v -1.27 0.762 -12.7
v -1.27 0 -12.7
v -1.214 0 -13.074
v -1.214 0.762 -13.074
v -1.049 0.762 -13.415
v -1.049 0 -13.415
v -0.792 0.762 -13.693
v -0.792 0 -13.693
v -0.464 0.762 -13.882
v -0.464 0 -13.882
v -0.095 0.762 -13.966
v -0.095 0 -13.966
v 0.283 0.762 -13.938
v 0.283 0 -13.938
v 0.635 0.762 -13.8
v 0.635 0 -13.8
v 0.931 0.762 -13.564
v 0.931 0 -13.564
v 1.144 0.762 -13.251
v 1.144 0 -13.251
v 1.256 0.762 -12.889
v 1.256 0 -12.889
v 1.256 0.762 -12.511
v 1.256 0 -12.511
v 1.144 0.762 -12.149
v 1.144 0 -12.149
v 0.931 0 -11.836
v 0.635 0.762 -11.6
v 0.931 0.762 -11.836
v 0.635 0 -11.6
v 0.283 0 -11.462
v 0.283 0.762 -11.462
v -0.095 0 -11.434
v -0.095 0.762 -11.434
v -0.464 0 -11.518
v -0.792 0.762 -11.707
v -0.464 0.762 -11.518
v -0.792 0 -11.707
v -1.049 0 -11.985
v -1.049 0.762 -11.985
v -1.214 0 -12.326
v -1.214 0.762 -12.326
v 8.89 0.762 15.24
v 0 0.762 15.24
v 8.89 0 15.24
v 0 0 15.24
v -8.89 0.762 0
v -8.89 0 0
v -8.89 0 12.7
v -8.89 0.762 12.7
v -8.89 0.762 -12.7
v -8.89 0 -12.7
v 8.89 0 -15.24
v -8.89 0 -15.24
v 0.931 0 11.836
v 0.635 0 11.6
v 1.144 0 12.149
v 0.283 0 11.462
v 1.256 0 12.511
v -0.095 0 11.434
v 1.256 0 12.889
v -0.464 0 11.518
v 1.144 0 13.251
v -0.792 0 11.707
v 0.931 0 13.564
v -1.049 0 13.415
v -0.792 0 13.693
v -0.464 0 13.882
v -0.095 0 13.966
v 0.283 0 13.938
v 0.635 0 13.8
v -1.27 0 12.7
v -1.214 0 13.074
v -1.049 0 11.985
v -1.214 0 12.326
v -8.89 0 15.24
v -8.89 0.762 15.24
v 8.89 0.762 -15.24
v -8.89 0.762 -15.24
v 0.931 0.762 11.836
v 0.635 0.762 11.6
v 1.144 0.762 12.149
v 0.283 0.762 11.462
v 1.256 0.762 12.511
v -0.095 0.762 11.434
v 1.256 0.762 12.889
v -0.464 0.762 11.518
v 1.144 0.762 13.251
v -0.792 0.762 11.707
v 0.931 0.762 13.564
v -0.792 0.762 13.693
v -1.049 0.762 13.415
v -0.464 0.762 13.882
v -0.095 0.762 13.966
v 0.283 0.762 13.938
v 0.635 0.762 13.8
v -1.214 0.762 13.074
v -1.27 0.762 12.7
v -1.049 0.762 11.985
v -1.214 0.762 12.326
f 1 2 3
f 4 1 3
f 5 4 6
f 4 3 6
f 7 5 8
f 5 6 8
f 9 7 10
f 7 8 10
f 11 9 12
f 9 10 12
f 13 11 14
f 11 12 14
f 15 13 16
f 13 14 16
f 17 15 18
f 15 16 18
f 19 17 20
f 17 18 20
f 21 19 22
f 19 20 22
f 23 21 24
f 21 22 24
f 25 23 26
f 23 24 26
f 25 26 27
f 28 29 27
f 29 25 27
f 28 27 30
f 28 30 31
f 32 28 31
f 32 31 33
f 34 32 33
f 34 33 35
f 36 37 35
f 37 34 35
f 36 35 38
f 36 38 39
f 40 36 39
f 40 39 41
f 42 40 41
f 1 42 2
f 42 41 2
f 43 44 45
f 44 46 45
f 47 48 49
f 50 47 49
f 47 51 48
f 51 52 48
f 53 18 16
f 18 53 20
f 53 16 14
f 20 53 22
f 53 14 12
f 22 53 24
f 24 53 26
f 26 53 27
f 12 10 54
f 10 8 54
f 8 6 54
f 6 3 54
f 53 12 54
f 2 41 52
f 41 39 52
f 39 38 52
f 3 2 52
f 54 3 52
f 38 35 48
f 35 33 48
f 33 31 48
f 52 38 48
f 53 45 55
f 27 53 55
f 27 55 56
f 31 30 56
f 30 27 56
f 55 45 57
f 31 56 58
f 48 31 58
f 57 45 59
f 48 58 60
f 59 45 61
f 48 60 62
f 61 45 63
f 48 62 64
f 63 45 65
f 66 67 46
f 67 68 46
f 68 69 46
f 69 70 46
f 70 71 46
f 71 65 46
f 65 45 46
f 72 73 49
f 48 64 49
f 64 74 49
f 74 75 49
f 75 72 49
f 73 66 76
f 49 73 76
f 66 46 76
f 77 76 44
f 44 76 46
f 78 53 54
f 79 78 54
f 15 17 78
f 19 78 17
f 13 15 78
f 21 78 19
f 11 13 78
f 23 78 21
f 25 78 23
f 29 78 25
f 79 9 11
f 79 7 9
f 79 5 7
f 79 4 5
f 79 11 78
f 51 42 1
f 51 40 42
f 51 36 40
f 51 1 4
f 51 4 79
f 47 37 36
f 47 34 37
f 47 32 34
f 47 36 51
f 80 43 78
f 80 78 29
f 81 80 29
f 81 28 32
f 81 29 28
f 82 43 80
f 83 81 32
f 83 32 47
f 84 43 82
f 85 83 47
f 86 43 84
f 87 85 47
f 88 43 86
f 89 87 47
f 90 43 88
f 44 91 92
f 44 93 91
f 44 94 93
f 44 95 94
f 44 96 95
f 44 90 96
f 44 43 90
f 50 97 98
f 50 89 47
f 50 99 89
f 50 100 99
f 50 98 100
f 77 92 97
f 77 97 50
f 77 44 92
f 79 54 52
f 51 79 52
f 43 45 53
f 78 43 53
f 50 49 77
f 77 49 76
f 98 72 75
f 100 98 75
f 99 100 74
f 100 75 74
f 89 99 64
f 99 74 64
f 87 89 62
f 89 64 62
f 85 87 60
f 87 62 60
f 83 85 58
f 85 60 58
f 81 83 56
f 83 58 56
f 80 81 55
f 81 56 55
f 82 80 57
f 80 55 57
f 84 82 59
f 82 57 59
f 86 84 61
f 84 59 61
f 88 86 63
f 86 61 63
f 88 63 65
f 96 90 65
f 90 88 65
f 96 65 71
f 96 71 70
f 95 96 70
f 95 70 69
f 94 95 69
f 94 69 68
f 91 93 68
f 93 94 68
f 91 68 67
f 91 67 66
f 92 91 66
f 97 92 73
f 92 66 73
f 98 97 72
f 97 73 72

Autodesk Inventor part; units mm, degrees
ref_plane "YZ Plane" through (0, 0, 0) normal (1, 0, 0) x (0, 1, 0)
ref_plane "XZ Plane" through (0, 0, 0) normal (0, 1, 0) x (-1, 0, 0)
ref_plane "XY Plane" through (0, 0, 0) normal (0, 0, 1) x (1, 0, 0)
sketch "Sketch1" plane through (0, 0, 0) normal (0, 1, 0) x (-1, 0, 0)
  line L0 (8.89, 15.24) -> (-8.89, 15.24)
  line L1 (-8.89, 15.24) -> (-8.89, -15.24)
  line L2 (-8.89, -15.24) -> (8.89, -15.24)
  line L3 (8.89, -15.24) -> (8.89, 15.24)
  line L4 (8.89, 15.24) -> (-8.89, -15.24) construction
  line L5 (-8.89, 15.24) -> (8.89, -15.24) construction
  line L6 (8.89, 0) -> (8.89, -12.7)
  line L7 (8.89, 0) -> (8.89, 12.7)
  line L8 (8.89, 15.24) -> (0, 15.24)
  circle A0 centre (0, 12.7) radius 1.27
  circle A1 centre (0, -12.7) radius 1.27
  point P0 (0, 0)
  dimension "d0" = 17.78
  dimension "d1" = 30.48
  dimension "d2" = 12.7
  dimension "d3" = 12.7
  dimension "d4" = 8.89
  dimension "d5" = 2.54
  dimension "d6" = 2.54
extrude "Extrusion1" add sketch "Sketch1" along normal blind 0.762
ref_plane "Work Plane1" through (-8.89, 0, 0) normal (0, 0, 1) x (1, 0, 0)
properties part number "adafruit_TCA9548A_board" material "PET Plastic White"
